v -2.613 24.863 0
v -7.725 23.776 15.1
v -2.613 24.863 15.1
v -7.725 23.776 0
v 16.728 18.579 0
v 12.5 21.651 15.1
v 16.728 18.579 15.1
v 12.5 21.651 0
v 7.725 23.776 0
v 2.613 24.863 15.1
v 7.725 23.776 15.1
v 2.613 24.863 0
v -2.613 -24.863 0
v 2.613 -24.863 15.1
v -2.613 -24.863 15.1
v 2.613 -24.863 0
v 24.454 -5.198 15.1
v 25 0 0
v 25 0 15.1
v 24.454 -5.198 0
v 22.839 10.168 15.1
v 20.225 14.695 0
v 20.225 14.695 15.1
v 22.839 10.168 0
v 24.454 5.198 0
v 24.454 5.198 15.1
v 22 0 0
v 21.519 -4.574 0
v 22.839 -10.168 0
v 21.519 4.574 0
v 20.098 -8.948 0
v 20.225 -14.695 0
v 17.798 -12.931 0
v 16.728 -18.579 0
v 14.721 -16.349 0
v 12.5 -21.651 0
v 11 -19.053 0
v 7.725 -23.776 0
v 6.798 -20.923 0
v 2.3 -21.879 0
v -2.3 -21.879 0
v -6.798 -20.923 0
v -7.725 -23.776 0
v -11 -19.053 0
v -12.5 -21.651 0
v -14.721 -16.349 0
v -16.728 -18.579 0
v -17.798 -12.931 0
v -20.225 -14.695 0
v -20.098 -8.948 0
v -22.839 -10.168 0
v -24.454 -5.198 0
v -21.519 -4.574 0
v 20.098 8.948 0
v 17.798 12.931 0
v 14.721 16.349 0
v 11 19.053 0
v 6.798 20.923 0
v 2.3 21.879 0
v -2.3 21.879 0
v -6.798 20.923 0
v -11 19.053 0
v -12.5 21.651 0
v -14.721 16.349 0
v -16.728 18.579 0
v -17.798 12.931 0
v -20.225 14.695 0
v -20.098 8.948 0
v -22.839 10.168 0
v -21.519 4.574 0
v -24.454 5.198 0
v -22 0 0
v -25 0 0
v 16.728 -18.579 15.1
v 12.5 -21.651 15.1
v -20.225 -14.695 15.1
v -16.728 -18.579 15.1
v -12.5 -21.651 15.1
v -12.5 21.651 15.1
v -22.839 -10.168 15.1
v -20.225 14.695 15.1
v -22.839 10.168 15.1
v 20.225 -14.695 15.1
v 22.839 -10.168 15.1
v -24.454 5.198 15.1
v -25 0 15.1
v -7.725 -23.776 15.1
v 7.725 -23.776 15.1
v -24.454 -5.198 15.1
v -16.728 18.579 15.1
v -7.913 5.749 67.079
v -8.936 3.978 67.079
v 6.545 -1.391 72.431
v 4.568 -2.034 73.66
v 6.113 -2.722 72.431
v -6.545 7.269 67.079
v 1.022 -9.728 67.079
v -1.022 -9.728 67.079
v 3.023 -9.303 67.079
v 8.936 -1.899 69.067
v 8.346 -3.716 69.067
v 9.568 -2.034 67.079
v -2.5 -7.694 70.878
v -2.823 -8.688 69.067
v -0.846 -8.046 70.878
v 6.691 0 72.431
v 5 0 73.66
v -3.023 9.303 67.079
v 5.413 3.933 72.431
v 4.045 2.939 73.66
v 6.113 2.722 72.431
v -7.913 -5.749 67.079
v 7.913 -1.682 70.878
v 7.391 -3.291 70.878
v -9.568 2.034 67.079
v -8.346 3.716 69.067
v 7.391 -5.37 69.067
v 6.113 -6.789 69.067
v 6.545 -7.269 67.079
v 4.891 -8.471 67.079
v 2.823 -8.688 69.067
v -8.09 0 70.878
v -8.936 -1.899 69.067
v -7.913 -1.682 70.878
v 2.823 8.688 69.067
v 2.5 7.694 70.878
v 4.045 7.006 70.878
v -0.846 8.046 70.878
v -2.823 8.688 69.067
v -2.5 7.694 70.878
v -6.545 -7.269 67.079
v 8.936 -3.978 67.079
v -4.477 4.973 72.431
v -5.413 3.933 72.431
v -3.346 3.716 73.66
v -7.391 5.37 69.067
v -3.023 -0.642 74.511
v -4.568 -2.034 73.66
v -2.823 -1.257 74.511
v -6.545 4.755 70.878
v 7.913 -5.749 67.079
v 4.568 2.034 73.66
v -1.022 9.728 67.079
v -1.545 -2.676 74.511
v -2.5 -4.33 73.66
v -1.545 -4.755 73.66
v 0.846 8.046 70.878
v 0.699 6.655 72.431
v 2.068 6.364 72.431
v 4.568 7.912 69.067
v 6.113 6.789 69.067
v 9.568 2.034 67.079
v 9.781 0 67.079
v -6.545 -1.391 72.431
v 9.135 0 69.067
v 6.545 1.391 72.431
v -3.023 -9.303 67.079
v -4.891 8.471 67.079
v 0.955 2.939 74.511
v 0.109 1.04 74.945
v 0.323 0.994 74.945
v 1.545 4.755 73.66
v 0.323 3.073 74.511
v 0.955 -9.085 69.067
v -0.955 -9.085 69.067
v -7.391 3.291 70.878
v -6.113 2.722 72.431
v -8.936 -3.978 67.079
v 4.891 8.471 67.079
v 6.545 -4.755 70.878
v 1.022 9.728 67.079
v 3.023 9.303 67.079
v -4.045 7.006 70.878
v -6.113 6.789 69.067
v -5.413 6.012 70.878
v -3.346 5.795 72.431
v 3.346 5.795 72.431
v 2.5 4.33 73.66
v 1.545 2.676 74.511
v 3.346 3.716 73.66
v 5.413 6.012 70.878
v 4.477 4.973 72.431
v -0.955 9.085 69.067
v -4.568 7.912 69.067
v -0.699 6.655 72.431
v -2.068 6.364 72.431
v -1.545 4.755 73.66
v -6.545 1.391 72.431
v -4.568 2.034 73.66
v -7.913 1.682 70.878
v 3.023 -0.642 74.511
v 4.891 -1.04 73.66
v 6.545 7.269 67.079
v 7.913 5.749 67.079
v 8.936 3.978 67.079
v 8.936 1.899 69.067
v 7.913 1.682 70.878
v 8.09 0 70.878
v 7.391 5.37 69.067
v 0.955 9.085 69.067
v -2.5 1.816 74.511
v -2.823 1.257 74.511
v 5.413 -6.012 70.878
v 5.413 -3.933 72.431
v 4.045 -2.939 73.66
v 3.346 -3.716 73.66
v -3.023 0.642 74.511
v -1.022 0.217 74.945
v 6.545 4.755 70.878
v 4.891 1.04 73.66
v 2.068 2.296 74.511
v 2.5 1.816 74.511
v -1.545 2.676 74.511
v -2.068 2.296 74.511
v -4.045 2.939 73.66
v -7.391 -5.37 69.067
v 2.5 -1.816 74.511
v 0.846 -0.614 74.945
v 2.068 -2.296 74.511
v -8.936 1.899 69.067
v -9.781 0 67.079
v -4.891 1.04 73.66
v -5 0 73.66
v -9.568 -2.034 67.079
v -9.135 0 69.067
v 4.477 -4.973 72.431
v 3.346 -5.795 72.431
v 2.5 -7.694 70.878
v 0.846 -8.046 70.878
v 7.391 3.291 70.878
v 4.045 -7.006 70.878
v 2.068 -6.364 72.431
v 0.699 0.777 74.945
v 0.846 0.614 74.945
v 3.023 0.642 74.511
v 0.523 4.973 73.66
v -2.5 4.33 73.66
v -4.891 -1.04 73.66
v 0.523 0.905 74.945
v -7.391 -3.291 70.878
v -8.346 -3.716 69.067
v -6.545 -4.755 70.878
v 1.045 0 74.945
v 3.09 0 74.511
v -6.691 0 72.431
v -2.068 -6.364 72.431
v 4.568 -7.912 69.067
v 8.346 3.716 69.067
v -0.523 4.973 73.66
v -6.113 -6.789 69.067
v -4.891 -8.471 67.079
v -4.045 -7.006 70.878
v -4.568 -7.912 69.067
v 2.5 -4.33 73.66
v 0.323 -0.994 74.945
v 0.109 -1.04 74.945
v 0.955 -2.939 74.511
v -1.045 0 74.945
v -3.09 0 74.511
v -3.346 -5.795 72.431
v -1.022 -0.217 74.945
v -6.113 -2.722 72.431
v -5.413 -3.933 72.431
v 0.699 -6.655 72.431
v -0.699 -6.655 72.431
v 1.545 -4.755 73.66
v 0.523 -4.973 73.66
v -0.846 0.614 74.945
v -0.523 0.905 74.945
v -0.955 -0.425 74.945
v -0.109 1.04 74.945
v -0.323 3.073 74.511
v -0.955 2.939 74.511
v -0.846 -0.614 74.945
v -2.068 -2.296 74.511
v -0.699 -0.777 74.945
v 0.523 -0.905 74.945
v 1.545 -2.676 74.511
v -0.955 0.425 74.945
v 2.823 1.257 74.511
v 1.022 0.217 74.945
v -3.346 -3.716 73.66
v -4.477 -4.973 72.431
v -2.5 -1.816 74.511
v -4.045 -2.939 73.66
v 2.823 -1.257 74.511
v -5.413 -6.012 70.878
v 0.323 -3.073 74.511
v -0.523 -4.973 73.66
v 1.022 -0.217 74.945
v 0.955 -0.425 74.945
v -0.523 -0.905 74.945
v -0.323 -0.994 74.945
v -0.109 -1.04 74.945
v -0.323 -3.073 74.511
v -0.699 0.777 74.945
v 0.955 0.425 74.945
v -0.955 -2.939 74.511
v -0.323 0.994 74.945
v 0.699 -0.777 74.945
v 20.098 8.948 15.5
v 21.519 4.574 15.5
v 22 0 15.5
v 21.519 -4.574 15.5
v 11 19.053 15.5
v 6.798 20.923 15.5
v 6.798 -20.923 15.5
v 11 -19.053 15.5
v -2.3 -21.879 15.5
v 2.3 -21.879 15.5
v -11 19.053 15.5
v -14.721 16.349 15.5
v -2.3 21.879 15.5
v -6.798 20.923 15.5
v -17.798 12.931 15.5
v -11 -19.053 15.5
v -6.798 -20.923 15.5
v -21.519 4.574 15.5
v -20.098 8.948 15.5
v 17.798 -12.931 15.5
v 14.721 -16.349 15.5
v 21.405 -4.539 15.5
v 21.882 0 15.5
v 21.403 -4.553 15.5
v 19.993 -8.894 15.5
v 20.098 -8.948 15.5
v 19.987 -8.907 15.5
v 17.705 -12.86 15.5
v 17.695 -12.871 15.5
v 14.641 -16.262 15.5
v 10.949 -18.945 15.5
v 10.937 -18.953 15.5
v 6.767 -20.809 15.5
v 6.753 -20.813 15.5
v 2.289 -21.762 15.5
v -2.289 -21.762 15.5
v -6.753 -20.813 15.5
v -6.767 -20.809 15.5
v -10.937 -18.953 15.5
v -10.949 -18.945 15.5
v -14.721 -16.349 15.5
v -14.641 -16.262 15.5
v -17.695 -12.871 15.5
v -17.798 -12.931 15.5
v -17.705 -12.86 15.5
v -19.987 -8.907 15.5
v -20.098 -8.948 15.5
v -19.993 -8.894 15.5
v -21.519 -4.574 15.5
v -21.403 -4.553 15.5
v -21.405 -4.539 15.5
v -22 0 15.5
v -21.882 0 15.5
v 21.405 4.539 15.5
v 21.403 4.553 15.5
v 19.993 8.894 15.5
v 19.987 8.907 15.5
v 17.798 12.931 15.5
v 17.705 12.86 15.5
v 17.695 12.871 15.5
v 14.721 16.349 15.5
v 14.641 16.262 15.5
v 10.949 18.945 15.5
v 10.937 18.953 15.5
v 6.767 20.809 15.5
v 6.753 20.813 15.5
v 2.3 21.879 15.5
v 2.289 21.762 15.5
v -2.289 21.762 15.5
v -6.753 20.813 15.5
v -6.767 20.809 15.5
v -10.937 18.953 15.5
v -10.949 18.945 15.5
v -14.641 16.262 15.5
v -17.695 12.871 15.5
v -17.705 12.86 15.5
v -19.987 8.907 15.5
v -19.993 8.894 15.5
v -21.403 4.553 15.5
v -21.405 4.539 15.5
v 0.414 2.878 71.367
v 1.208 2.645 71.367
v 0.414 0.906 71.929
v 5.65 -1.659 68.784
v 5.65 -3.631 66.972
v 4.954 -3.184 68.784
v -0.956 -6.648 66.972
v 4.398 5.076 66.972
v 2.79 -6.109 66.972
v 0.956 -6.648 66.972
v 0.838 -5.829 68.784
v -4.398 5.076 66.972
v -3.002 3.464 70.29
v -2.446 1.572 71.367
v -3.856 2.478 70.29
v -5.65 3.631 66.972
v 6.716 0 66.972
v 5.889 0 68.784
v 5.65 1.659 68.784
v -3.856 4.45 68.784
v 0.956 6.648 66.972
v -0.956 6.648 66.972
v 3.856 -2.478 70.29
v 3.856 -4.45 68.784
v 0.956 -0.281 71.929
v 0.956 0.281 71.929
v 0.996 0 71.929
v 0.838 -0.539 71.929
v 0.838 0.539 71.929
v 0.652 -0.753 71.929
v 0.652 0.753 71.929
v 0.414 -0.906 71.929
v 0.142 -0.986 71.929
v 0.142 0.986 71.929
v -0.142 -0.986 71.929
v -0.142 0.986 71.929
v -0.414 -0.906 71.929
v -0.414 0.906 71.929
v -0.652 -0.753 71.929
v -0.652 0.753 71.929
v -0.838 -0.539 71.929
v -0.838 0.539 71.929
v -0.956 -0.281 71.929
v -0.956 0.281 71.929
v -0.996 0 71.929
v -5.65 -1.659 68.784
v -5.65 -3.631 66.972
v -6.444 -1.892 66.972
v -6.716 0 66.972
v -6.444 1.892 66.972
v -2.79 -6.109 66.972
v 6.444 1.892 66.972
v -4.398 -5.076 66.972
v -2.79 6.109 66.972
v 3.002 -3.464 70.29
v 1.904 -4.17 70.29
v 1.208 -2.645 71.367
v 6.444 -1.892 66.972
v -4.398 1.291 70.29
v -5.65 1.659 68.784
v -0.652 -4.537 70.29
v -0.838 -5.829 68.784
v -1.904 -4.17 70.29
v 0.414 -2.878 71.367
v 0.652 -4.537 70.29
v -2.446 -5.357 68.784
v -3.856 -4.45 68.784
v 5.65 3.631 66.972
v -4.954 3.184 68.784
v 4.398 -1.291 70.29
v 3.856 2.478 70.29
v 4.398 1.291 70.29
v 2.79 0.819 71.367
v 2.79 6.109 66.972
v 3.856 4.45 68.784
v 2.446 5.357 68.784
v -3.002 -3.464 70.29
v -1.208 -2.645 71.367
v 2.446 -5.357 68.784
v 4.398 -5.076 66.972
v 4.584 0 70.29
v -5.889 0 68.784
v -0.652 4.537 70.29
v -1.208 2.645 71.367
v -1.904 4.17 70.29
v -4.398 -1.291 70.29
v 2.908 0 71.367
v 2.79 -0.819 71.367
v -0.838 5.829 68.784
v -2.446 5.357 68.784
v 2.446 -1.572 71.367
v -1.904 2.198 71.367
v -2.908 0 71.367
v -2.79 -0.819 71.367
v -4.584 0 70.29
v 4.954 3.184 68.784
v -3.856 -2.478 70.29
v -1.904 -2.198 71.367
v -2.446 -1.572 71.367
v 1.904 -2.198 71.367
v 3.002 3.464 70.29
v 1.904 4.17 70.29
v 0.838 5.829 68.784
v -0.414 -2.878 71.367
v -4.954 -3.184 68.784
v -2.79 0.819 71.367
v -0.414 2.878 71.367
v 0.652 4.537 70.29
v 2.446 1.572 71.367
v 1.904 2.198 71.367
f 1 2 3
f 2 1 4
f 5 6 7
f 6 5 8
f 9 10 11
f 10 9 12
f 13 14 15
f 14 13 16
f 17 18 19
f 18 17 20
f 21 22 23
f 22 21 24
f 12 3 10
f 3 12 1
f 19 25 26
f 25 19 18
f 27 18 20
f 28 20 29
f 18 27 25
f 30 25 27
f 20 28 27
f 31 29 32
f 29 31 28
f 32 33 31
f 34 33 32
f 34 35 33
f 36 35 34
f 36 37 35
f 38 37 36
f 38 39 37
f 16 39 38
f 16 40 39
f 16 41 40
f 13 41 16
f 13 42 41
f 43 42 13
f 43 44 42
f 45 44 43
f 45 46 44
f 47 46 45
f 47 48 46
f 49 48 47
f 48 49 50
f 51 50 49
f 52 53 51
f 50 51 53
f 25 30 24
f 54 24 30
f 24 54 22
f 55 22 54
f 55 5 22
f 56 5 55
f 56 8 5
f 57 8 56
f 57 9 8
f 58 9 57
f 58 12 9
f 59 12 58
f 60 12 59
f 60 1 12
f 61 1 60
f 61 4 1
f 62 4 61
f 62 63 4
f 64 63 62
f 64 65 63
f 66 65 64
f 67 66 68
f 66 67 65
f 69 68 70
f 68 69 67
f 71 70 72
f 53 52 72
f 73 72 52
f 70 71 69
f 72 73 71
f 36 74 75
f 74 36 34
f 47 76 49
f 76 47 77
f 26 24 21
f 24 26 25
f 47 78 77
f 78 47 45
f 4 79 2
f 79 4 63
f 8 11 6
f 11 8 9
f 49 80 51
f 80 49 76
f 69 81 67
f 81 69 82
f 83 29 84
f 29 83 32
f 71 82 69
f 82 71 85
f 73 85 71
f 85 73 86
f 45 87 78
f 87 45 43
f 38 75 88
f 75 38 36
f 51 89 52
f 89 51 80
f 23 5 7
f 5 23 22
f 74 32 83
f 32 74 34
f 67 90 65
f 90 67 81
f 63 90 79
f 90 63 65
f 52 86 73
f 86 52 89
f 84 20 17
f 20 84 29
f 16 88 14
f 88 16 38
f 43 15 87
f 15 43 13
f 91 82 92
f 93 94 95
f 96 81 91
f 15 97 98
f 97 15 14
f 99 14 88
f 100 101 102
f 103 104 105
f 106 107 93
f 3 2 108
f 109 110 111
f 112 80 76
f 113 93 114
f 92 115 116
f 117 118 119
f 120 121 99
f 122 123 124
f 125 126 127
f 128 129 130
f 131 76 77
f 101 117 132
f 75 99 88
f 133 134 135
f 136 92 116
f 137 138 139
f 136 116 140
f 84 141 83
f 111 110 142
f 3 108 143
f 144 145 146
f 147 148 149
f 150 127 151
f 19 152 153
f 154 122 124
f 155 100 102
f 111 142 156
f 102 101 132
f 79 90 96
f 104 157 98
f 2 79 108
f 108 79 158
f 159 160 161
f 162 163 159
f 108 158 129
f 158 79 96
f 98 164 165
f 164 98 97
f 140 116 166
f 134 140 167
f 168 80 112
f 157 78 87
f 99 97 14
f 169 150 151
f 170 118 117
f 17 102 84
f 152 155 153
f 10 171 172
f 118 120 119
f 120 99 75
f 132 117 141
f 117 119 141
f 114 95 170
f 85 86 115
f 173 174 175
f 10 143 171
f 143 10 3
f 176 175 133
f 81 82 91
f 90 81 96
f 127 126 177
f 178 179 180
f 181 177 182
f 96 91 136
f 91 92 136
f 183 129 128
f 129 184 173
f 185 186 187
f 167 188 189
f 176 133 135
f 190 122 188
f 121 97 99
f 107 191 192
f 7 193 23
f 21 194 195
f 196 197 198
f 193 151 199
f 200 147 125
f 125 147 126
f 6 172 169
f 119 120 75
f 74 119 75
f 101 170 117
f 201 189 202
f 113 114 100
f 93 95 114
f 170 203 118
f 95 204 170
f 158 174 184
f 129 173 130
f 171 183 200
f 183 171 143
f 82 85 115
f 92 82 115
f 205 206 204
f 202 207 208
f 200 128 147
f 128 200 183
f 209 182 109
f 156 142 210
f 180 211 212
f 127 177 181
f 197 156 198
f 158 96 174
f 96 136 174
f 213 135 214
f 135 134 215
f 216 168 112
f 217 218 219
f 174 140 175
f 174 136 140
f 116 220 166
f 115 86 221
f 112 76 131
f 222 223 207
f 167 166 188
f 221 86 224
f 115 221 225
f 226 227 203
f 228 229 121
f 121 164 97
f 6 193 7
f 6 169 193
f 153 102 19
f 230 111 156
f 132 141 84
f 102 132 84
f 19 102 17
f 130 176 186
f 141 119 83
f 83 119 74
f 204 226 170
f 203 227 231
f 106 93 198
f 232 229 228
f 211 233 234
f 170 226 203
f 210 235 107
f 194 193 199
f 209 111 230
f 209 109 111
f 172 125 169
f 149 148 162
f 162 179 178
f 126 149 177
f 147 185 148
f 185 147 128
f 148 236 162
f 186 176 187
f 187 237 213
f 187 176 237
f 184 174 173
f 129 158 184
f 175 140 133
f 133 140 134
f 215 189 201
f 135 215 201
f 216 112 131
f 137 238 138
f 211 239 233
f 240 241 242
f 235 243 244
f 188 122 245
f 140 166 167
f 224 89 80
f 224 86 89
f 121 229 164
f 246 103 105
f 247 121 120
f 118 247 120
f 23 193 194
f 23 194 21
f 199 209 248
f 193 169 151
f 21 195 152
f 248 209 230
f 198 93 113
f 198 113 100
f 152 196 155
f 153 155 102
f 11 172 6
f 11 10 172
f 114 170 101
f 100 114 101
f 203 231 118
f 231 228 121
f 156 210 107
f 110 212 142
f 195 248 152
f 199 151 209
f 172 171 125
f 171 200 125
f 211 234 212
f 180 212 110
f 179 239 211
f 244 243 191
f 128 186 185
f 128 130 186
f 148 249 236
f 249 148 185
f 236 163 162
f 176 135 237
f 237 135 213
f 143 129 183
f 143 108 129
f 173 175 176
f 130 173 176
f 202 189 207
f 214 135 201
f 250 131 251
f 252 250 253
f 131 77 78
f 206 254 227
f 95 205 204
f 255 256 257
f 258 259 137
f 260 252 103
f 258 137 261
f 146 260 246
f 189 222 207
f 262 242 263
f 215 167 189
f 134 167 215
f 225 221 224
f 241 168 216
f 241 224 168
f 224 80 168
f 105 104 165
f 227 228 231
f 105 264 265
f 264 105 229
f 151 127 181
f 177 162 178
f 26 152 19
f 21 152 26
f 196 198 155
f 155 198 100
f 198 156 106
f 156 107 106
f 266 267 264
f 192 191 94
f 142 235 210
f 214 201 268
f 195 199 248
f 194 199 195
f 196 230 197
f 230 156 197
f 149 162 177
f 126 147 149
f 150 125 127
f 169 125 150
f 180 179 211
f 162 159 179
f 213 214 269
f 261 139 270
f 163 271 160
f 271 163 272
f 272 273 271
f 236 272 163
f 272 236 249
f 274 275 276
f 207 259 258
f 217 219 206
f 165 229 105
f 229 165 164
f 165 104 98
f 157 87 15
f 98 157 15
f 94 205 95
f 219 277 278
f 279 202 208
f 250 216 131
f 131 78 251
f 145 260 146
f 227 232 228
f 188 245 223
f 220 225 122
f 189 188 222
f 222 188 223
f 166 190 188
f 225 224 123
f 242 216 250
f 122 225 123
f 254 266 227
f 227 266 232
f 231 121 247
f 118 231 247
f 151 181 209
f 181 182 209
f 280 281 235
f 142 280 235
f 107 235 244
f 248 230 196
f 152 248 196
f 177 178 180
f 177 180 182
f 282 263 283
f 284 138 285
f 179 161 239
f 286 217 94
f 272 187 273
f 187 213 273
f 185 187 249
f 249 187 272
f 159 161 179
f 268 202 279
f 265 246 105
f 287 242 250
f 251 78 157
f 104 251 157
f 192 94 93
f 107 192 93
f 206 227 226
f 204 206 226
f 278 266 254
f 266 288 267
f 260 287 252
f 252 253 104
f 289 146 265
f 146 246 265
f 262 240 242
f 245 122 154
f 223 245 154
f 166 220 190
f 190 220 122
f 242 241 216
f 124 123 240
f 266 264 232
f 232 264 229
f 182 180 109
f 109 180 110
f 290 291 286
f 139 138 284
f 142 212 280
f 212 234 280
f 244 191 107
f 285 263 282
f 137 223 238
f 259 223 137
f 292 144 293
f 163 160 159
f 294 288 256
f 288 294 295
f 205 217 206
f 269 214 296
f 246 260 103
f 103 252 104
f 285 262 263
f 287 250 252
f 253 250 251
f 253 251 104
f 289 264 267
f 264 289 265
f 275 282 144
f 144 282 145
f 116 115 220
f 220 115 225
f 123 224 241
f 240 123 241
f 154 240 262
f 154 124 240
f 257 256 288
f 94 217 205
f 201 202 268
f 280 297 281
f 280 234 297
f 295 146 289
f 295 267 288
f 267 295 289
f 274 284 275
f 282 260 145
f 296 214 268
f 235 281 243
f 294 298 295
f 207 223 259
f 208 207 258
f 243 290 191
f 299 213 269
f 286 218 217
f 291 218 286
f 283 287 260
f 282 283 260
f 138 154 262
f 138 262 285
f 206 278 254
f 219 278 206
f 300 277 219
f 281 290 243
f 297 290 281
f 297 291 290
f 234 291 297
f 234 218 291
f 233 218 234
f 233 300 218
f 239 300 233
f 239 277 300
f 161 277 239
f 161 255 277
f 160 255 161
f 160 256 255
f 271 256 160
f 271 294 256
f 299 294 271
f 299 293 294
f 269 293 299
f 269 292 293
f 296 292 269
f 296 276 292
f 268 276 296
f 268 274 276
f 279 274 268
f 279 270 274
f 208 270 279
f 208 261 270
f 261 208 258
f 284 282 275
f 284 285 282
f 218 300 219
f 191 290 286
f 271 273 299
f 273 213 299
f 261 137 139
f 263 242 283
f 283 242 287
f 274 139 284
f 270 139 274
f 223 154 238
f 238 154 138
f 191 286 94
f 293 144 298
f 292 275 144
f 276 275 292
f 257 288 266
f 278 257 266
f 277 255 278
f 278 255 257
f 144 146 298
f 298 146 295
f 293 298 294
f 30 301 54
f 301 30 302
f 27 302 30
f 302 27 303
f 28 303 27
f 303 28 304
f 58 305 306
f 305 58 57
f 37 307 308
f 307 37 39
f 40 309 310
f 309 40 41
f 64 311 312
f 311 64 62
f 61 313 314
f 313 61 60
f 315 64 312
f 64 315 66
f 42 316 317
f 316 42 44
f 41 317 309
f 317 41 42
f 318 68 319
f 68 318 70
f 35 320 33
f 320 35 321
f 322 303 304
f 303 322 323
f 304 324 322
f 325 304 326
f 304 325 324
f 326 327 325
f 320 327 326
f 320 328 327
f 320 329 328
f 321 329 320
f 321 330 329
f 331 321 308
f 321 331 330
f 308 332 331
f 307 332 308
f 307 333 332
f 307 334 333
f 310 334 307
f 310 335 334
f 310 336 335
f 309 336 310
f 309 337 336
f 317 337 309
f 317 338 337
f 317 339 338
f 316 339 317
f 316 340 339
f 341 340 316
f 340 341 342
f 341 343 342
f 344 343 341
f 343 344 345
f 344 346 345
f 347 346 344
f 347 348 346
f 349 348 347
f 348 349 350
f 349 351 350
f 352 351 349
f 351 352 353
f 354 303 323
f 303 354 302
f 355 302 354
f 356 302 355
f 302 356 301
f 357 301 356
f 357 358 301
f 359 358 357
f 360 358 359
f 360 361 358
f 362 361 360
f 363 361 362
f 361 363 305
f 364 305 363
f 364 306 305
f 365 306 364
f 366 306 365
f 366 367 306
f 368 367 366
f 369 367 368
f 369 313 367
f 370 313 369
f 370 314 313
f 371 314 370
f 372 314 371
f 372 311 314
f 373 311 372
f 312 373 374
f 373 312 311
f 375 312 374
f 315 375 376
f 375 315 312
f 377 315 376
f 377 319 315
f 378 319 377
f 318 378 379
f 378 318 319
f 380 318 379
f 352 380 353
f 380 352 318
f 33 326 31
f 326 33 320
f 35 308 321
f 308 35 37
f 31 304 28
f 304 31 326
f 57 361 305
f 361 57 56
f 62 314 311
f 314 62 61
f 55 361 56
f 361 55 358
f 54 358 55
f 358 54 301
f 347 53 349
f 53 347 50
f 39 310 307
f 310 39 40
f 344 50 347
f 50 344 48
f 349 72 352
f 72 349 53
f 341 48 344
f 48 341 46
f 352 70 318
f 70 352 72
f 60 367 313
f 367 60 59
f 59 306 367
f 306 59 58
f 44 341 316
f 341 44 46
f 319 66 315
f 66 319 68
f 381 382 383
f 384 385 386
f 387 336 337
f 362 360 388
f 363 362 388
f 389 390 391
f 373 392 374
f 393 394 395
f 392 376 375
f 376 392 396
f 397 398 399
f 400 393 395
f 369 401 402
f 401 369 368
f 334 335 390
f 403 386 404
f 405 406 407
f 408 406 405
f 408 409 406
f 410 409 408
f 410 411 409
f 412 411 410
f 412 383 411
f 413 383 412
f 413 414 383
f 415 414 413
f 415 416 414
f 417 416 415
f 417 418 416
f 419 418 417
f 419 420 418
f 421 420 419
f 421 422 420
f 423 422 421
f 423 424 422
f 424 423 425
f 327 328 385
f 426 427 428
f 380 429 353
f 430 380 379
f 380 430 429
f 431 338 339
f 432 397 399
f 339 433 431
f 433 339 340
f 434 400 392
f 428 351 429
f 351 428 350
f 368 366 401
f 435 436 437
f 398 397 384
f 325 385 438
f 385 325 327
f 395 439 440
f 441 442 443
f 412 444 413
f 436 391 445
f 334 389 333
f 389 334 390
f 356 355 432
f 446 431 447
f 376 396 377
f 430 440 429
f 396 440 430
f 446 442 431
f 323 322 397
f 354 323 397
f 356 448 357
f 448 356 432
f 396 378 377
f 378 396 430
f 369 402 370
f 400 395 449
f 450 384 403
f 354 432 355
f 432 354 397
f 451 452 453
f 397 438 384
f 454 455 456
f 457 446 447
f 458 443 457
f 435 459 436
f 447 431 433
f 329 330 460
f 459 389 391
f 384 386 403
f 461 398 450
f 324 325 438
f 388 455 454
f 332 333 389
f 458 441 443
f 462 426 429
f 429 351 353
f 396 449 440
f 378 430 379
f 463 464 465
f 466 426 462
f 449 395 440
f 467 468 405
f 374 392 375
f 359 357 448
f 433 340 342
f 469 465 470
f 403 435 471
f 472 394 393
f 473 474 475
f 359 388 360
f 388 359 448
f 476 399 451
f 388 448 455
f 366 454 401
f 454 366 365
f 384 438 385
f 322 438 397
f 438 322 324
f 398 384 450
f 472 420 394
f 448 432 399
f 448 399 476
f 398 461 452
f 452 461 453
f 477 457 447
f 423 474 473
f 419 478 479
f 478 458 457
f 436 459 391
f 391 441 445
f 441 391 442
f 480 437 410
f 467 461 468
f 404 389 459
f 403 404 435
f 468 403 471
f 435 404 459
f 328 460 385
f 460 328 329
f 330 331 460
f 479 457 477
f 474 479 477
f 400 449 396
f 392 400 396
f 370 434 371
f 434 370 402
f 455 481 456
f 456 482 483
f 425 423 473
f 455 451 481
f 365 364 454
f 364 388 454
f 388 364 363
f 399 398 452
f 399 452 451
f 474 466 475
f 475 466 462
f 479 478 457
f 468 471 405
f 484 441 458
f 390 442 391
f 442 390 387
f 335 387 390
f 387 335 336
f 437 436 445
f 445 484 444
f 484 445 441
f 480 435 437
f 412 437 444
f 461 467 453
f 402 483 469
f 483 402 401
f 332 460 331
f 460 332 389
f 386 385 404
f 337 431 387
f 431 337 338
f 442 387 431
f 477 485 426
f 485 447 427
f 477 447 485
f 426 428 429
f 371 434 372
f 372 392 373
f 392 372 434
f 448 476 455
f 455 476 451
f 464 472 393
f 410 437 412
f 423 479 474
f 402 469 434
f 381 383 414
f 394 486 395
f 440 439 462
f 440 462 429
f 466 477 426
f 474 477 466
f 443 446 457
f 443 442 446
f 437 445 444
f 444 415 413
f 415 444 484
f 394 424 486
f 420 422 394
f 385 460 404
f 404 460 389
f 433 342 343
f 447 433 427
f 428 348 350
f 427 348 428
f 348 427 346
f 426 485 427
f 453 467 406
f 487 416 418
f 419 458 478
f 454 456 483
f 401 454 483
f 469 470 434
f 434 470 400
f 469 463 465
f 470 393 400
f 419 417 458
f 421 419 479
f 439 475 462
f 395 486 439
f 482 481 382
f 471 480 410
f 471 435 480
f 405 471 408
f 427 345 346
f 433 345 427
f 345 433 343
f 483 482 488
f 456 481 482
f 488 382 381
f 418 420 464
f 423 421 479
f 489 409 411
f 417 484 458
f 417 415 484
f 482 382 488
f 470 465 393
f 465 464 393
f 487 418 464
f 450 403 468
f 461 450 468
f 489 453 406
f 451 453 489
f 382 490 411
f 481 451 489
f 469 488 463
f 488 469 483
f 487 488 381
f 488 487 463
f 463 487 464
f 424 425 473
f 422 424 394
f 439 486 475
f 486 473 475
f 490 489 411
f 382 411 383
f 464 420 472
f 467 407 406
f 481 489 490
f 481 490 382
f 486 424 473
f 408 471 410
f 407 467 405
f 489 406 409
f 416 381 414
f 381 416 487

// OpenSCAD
// --- Variables ---
tube_diameter = 50;
adapter_height = 15;

cone_height = 60;
cone_radius1 = tube_diameter / 2; // Base radius, derived from diameter
cone_radius2 = 10;                // Top radius
thickness = 3;                    // Desired wall thickness

// --- Module Definition ---
module cone() {
    // Use difference() to subtract the inner shape from the outer shape
    difference() {
        
        // --- 1. The Outer (Solid) Shape ---
        // We join the straight adapter with the new rounded cone part
        union() {
            // Adapter cylinder (this part remains straight)
            cylinder(adapter_height, r=cone_radius1);
            
            // Create a rounded cone by "hulling" the top of the
            // adapter with the sphere at the tip.
            hull() {
                // Base of the hull: a thin cylinder at the top of the adapter
                translate([0, 0, adapter_height])
                cylinder(0.1, r=cone_radius1); // Use a tiny height
                
                // Top of the hull: the outer sphere
                translate([0, 0, adapter_height + cone_height - cone_radius2])
                sphere(r = cone_radius2);
            }
        }
        
        // --- 2. The Inner (Cutout) Shape ---
        // This shape is 'thickness' smaller in radius
        epsilon = 0.5; // A small value to prevent z-fighting
        
        union() {
            // Inner adapter cylinder (straight cutout)
            translate([0, 0, -epsilon])
            cylinder(adapter_height + (2*epsilon), r=cone_radius1 - thickness);
            
            // Inner rounded cone cutout (using hull)
            hull() {
                // Base of the inner hull
                translate([0, 0, adapter_height])
                cylinder(0.1, r=cone_radius1 - thickness);
                
                // Top of the inner hull: the inner sphere
                translate([0, 0, adapter_height + cone_height - cone_radius2])
                sphere(r = cone_radius2 - thickness);
            }
        }
    }
}

// --- Render the Module ---
cone();
